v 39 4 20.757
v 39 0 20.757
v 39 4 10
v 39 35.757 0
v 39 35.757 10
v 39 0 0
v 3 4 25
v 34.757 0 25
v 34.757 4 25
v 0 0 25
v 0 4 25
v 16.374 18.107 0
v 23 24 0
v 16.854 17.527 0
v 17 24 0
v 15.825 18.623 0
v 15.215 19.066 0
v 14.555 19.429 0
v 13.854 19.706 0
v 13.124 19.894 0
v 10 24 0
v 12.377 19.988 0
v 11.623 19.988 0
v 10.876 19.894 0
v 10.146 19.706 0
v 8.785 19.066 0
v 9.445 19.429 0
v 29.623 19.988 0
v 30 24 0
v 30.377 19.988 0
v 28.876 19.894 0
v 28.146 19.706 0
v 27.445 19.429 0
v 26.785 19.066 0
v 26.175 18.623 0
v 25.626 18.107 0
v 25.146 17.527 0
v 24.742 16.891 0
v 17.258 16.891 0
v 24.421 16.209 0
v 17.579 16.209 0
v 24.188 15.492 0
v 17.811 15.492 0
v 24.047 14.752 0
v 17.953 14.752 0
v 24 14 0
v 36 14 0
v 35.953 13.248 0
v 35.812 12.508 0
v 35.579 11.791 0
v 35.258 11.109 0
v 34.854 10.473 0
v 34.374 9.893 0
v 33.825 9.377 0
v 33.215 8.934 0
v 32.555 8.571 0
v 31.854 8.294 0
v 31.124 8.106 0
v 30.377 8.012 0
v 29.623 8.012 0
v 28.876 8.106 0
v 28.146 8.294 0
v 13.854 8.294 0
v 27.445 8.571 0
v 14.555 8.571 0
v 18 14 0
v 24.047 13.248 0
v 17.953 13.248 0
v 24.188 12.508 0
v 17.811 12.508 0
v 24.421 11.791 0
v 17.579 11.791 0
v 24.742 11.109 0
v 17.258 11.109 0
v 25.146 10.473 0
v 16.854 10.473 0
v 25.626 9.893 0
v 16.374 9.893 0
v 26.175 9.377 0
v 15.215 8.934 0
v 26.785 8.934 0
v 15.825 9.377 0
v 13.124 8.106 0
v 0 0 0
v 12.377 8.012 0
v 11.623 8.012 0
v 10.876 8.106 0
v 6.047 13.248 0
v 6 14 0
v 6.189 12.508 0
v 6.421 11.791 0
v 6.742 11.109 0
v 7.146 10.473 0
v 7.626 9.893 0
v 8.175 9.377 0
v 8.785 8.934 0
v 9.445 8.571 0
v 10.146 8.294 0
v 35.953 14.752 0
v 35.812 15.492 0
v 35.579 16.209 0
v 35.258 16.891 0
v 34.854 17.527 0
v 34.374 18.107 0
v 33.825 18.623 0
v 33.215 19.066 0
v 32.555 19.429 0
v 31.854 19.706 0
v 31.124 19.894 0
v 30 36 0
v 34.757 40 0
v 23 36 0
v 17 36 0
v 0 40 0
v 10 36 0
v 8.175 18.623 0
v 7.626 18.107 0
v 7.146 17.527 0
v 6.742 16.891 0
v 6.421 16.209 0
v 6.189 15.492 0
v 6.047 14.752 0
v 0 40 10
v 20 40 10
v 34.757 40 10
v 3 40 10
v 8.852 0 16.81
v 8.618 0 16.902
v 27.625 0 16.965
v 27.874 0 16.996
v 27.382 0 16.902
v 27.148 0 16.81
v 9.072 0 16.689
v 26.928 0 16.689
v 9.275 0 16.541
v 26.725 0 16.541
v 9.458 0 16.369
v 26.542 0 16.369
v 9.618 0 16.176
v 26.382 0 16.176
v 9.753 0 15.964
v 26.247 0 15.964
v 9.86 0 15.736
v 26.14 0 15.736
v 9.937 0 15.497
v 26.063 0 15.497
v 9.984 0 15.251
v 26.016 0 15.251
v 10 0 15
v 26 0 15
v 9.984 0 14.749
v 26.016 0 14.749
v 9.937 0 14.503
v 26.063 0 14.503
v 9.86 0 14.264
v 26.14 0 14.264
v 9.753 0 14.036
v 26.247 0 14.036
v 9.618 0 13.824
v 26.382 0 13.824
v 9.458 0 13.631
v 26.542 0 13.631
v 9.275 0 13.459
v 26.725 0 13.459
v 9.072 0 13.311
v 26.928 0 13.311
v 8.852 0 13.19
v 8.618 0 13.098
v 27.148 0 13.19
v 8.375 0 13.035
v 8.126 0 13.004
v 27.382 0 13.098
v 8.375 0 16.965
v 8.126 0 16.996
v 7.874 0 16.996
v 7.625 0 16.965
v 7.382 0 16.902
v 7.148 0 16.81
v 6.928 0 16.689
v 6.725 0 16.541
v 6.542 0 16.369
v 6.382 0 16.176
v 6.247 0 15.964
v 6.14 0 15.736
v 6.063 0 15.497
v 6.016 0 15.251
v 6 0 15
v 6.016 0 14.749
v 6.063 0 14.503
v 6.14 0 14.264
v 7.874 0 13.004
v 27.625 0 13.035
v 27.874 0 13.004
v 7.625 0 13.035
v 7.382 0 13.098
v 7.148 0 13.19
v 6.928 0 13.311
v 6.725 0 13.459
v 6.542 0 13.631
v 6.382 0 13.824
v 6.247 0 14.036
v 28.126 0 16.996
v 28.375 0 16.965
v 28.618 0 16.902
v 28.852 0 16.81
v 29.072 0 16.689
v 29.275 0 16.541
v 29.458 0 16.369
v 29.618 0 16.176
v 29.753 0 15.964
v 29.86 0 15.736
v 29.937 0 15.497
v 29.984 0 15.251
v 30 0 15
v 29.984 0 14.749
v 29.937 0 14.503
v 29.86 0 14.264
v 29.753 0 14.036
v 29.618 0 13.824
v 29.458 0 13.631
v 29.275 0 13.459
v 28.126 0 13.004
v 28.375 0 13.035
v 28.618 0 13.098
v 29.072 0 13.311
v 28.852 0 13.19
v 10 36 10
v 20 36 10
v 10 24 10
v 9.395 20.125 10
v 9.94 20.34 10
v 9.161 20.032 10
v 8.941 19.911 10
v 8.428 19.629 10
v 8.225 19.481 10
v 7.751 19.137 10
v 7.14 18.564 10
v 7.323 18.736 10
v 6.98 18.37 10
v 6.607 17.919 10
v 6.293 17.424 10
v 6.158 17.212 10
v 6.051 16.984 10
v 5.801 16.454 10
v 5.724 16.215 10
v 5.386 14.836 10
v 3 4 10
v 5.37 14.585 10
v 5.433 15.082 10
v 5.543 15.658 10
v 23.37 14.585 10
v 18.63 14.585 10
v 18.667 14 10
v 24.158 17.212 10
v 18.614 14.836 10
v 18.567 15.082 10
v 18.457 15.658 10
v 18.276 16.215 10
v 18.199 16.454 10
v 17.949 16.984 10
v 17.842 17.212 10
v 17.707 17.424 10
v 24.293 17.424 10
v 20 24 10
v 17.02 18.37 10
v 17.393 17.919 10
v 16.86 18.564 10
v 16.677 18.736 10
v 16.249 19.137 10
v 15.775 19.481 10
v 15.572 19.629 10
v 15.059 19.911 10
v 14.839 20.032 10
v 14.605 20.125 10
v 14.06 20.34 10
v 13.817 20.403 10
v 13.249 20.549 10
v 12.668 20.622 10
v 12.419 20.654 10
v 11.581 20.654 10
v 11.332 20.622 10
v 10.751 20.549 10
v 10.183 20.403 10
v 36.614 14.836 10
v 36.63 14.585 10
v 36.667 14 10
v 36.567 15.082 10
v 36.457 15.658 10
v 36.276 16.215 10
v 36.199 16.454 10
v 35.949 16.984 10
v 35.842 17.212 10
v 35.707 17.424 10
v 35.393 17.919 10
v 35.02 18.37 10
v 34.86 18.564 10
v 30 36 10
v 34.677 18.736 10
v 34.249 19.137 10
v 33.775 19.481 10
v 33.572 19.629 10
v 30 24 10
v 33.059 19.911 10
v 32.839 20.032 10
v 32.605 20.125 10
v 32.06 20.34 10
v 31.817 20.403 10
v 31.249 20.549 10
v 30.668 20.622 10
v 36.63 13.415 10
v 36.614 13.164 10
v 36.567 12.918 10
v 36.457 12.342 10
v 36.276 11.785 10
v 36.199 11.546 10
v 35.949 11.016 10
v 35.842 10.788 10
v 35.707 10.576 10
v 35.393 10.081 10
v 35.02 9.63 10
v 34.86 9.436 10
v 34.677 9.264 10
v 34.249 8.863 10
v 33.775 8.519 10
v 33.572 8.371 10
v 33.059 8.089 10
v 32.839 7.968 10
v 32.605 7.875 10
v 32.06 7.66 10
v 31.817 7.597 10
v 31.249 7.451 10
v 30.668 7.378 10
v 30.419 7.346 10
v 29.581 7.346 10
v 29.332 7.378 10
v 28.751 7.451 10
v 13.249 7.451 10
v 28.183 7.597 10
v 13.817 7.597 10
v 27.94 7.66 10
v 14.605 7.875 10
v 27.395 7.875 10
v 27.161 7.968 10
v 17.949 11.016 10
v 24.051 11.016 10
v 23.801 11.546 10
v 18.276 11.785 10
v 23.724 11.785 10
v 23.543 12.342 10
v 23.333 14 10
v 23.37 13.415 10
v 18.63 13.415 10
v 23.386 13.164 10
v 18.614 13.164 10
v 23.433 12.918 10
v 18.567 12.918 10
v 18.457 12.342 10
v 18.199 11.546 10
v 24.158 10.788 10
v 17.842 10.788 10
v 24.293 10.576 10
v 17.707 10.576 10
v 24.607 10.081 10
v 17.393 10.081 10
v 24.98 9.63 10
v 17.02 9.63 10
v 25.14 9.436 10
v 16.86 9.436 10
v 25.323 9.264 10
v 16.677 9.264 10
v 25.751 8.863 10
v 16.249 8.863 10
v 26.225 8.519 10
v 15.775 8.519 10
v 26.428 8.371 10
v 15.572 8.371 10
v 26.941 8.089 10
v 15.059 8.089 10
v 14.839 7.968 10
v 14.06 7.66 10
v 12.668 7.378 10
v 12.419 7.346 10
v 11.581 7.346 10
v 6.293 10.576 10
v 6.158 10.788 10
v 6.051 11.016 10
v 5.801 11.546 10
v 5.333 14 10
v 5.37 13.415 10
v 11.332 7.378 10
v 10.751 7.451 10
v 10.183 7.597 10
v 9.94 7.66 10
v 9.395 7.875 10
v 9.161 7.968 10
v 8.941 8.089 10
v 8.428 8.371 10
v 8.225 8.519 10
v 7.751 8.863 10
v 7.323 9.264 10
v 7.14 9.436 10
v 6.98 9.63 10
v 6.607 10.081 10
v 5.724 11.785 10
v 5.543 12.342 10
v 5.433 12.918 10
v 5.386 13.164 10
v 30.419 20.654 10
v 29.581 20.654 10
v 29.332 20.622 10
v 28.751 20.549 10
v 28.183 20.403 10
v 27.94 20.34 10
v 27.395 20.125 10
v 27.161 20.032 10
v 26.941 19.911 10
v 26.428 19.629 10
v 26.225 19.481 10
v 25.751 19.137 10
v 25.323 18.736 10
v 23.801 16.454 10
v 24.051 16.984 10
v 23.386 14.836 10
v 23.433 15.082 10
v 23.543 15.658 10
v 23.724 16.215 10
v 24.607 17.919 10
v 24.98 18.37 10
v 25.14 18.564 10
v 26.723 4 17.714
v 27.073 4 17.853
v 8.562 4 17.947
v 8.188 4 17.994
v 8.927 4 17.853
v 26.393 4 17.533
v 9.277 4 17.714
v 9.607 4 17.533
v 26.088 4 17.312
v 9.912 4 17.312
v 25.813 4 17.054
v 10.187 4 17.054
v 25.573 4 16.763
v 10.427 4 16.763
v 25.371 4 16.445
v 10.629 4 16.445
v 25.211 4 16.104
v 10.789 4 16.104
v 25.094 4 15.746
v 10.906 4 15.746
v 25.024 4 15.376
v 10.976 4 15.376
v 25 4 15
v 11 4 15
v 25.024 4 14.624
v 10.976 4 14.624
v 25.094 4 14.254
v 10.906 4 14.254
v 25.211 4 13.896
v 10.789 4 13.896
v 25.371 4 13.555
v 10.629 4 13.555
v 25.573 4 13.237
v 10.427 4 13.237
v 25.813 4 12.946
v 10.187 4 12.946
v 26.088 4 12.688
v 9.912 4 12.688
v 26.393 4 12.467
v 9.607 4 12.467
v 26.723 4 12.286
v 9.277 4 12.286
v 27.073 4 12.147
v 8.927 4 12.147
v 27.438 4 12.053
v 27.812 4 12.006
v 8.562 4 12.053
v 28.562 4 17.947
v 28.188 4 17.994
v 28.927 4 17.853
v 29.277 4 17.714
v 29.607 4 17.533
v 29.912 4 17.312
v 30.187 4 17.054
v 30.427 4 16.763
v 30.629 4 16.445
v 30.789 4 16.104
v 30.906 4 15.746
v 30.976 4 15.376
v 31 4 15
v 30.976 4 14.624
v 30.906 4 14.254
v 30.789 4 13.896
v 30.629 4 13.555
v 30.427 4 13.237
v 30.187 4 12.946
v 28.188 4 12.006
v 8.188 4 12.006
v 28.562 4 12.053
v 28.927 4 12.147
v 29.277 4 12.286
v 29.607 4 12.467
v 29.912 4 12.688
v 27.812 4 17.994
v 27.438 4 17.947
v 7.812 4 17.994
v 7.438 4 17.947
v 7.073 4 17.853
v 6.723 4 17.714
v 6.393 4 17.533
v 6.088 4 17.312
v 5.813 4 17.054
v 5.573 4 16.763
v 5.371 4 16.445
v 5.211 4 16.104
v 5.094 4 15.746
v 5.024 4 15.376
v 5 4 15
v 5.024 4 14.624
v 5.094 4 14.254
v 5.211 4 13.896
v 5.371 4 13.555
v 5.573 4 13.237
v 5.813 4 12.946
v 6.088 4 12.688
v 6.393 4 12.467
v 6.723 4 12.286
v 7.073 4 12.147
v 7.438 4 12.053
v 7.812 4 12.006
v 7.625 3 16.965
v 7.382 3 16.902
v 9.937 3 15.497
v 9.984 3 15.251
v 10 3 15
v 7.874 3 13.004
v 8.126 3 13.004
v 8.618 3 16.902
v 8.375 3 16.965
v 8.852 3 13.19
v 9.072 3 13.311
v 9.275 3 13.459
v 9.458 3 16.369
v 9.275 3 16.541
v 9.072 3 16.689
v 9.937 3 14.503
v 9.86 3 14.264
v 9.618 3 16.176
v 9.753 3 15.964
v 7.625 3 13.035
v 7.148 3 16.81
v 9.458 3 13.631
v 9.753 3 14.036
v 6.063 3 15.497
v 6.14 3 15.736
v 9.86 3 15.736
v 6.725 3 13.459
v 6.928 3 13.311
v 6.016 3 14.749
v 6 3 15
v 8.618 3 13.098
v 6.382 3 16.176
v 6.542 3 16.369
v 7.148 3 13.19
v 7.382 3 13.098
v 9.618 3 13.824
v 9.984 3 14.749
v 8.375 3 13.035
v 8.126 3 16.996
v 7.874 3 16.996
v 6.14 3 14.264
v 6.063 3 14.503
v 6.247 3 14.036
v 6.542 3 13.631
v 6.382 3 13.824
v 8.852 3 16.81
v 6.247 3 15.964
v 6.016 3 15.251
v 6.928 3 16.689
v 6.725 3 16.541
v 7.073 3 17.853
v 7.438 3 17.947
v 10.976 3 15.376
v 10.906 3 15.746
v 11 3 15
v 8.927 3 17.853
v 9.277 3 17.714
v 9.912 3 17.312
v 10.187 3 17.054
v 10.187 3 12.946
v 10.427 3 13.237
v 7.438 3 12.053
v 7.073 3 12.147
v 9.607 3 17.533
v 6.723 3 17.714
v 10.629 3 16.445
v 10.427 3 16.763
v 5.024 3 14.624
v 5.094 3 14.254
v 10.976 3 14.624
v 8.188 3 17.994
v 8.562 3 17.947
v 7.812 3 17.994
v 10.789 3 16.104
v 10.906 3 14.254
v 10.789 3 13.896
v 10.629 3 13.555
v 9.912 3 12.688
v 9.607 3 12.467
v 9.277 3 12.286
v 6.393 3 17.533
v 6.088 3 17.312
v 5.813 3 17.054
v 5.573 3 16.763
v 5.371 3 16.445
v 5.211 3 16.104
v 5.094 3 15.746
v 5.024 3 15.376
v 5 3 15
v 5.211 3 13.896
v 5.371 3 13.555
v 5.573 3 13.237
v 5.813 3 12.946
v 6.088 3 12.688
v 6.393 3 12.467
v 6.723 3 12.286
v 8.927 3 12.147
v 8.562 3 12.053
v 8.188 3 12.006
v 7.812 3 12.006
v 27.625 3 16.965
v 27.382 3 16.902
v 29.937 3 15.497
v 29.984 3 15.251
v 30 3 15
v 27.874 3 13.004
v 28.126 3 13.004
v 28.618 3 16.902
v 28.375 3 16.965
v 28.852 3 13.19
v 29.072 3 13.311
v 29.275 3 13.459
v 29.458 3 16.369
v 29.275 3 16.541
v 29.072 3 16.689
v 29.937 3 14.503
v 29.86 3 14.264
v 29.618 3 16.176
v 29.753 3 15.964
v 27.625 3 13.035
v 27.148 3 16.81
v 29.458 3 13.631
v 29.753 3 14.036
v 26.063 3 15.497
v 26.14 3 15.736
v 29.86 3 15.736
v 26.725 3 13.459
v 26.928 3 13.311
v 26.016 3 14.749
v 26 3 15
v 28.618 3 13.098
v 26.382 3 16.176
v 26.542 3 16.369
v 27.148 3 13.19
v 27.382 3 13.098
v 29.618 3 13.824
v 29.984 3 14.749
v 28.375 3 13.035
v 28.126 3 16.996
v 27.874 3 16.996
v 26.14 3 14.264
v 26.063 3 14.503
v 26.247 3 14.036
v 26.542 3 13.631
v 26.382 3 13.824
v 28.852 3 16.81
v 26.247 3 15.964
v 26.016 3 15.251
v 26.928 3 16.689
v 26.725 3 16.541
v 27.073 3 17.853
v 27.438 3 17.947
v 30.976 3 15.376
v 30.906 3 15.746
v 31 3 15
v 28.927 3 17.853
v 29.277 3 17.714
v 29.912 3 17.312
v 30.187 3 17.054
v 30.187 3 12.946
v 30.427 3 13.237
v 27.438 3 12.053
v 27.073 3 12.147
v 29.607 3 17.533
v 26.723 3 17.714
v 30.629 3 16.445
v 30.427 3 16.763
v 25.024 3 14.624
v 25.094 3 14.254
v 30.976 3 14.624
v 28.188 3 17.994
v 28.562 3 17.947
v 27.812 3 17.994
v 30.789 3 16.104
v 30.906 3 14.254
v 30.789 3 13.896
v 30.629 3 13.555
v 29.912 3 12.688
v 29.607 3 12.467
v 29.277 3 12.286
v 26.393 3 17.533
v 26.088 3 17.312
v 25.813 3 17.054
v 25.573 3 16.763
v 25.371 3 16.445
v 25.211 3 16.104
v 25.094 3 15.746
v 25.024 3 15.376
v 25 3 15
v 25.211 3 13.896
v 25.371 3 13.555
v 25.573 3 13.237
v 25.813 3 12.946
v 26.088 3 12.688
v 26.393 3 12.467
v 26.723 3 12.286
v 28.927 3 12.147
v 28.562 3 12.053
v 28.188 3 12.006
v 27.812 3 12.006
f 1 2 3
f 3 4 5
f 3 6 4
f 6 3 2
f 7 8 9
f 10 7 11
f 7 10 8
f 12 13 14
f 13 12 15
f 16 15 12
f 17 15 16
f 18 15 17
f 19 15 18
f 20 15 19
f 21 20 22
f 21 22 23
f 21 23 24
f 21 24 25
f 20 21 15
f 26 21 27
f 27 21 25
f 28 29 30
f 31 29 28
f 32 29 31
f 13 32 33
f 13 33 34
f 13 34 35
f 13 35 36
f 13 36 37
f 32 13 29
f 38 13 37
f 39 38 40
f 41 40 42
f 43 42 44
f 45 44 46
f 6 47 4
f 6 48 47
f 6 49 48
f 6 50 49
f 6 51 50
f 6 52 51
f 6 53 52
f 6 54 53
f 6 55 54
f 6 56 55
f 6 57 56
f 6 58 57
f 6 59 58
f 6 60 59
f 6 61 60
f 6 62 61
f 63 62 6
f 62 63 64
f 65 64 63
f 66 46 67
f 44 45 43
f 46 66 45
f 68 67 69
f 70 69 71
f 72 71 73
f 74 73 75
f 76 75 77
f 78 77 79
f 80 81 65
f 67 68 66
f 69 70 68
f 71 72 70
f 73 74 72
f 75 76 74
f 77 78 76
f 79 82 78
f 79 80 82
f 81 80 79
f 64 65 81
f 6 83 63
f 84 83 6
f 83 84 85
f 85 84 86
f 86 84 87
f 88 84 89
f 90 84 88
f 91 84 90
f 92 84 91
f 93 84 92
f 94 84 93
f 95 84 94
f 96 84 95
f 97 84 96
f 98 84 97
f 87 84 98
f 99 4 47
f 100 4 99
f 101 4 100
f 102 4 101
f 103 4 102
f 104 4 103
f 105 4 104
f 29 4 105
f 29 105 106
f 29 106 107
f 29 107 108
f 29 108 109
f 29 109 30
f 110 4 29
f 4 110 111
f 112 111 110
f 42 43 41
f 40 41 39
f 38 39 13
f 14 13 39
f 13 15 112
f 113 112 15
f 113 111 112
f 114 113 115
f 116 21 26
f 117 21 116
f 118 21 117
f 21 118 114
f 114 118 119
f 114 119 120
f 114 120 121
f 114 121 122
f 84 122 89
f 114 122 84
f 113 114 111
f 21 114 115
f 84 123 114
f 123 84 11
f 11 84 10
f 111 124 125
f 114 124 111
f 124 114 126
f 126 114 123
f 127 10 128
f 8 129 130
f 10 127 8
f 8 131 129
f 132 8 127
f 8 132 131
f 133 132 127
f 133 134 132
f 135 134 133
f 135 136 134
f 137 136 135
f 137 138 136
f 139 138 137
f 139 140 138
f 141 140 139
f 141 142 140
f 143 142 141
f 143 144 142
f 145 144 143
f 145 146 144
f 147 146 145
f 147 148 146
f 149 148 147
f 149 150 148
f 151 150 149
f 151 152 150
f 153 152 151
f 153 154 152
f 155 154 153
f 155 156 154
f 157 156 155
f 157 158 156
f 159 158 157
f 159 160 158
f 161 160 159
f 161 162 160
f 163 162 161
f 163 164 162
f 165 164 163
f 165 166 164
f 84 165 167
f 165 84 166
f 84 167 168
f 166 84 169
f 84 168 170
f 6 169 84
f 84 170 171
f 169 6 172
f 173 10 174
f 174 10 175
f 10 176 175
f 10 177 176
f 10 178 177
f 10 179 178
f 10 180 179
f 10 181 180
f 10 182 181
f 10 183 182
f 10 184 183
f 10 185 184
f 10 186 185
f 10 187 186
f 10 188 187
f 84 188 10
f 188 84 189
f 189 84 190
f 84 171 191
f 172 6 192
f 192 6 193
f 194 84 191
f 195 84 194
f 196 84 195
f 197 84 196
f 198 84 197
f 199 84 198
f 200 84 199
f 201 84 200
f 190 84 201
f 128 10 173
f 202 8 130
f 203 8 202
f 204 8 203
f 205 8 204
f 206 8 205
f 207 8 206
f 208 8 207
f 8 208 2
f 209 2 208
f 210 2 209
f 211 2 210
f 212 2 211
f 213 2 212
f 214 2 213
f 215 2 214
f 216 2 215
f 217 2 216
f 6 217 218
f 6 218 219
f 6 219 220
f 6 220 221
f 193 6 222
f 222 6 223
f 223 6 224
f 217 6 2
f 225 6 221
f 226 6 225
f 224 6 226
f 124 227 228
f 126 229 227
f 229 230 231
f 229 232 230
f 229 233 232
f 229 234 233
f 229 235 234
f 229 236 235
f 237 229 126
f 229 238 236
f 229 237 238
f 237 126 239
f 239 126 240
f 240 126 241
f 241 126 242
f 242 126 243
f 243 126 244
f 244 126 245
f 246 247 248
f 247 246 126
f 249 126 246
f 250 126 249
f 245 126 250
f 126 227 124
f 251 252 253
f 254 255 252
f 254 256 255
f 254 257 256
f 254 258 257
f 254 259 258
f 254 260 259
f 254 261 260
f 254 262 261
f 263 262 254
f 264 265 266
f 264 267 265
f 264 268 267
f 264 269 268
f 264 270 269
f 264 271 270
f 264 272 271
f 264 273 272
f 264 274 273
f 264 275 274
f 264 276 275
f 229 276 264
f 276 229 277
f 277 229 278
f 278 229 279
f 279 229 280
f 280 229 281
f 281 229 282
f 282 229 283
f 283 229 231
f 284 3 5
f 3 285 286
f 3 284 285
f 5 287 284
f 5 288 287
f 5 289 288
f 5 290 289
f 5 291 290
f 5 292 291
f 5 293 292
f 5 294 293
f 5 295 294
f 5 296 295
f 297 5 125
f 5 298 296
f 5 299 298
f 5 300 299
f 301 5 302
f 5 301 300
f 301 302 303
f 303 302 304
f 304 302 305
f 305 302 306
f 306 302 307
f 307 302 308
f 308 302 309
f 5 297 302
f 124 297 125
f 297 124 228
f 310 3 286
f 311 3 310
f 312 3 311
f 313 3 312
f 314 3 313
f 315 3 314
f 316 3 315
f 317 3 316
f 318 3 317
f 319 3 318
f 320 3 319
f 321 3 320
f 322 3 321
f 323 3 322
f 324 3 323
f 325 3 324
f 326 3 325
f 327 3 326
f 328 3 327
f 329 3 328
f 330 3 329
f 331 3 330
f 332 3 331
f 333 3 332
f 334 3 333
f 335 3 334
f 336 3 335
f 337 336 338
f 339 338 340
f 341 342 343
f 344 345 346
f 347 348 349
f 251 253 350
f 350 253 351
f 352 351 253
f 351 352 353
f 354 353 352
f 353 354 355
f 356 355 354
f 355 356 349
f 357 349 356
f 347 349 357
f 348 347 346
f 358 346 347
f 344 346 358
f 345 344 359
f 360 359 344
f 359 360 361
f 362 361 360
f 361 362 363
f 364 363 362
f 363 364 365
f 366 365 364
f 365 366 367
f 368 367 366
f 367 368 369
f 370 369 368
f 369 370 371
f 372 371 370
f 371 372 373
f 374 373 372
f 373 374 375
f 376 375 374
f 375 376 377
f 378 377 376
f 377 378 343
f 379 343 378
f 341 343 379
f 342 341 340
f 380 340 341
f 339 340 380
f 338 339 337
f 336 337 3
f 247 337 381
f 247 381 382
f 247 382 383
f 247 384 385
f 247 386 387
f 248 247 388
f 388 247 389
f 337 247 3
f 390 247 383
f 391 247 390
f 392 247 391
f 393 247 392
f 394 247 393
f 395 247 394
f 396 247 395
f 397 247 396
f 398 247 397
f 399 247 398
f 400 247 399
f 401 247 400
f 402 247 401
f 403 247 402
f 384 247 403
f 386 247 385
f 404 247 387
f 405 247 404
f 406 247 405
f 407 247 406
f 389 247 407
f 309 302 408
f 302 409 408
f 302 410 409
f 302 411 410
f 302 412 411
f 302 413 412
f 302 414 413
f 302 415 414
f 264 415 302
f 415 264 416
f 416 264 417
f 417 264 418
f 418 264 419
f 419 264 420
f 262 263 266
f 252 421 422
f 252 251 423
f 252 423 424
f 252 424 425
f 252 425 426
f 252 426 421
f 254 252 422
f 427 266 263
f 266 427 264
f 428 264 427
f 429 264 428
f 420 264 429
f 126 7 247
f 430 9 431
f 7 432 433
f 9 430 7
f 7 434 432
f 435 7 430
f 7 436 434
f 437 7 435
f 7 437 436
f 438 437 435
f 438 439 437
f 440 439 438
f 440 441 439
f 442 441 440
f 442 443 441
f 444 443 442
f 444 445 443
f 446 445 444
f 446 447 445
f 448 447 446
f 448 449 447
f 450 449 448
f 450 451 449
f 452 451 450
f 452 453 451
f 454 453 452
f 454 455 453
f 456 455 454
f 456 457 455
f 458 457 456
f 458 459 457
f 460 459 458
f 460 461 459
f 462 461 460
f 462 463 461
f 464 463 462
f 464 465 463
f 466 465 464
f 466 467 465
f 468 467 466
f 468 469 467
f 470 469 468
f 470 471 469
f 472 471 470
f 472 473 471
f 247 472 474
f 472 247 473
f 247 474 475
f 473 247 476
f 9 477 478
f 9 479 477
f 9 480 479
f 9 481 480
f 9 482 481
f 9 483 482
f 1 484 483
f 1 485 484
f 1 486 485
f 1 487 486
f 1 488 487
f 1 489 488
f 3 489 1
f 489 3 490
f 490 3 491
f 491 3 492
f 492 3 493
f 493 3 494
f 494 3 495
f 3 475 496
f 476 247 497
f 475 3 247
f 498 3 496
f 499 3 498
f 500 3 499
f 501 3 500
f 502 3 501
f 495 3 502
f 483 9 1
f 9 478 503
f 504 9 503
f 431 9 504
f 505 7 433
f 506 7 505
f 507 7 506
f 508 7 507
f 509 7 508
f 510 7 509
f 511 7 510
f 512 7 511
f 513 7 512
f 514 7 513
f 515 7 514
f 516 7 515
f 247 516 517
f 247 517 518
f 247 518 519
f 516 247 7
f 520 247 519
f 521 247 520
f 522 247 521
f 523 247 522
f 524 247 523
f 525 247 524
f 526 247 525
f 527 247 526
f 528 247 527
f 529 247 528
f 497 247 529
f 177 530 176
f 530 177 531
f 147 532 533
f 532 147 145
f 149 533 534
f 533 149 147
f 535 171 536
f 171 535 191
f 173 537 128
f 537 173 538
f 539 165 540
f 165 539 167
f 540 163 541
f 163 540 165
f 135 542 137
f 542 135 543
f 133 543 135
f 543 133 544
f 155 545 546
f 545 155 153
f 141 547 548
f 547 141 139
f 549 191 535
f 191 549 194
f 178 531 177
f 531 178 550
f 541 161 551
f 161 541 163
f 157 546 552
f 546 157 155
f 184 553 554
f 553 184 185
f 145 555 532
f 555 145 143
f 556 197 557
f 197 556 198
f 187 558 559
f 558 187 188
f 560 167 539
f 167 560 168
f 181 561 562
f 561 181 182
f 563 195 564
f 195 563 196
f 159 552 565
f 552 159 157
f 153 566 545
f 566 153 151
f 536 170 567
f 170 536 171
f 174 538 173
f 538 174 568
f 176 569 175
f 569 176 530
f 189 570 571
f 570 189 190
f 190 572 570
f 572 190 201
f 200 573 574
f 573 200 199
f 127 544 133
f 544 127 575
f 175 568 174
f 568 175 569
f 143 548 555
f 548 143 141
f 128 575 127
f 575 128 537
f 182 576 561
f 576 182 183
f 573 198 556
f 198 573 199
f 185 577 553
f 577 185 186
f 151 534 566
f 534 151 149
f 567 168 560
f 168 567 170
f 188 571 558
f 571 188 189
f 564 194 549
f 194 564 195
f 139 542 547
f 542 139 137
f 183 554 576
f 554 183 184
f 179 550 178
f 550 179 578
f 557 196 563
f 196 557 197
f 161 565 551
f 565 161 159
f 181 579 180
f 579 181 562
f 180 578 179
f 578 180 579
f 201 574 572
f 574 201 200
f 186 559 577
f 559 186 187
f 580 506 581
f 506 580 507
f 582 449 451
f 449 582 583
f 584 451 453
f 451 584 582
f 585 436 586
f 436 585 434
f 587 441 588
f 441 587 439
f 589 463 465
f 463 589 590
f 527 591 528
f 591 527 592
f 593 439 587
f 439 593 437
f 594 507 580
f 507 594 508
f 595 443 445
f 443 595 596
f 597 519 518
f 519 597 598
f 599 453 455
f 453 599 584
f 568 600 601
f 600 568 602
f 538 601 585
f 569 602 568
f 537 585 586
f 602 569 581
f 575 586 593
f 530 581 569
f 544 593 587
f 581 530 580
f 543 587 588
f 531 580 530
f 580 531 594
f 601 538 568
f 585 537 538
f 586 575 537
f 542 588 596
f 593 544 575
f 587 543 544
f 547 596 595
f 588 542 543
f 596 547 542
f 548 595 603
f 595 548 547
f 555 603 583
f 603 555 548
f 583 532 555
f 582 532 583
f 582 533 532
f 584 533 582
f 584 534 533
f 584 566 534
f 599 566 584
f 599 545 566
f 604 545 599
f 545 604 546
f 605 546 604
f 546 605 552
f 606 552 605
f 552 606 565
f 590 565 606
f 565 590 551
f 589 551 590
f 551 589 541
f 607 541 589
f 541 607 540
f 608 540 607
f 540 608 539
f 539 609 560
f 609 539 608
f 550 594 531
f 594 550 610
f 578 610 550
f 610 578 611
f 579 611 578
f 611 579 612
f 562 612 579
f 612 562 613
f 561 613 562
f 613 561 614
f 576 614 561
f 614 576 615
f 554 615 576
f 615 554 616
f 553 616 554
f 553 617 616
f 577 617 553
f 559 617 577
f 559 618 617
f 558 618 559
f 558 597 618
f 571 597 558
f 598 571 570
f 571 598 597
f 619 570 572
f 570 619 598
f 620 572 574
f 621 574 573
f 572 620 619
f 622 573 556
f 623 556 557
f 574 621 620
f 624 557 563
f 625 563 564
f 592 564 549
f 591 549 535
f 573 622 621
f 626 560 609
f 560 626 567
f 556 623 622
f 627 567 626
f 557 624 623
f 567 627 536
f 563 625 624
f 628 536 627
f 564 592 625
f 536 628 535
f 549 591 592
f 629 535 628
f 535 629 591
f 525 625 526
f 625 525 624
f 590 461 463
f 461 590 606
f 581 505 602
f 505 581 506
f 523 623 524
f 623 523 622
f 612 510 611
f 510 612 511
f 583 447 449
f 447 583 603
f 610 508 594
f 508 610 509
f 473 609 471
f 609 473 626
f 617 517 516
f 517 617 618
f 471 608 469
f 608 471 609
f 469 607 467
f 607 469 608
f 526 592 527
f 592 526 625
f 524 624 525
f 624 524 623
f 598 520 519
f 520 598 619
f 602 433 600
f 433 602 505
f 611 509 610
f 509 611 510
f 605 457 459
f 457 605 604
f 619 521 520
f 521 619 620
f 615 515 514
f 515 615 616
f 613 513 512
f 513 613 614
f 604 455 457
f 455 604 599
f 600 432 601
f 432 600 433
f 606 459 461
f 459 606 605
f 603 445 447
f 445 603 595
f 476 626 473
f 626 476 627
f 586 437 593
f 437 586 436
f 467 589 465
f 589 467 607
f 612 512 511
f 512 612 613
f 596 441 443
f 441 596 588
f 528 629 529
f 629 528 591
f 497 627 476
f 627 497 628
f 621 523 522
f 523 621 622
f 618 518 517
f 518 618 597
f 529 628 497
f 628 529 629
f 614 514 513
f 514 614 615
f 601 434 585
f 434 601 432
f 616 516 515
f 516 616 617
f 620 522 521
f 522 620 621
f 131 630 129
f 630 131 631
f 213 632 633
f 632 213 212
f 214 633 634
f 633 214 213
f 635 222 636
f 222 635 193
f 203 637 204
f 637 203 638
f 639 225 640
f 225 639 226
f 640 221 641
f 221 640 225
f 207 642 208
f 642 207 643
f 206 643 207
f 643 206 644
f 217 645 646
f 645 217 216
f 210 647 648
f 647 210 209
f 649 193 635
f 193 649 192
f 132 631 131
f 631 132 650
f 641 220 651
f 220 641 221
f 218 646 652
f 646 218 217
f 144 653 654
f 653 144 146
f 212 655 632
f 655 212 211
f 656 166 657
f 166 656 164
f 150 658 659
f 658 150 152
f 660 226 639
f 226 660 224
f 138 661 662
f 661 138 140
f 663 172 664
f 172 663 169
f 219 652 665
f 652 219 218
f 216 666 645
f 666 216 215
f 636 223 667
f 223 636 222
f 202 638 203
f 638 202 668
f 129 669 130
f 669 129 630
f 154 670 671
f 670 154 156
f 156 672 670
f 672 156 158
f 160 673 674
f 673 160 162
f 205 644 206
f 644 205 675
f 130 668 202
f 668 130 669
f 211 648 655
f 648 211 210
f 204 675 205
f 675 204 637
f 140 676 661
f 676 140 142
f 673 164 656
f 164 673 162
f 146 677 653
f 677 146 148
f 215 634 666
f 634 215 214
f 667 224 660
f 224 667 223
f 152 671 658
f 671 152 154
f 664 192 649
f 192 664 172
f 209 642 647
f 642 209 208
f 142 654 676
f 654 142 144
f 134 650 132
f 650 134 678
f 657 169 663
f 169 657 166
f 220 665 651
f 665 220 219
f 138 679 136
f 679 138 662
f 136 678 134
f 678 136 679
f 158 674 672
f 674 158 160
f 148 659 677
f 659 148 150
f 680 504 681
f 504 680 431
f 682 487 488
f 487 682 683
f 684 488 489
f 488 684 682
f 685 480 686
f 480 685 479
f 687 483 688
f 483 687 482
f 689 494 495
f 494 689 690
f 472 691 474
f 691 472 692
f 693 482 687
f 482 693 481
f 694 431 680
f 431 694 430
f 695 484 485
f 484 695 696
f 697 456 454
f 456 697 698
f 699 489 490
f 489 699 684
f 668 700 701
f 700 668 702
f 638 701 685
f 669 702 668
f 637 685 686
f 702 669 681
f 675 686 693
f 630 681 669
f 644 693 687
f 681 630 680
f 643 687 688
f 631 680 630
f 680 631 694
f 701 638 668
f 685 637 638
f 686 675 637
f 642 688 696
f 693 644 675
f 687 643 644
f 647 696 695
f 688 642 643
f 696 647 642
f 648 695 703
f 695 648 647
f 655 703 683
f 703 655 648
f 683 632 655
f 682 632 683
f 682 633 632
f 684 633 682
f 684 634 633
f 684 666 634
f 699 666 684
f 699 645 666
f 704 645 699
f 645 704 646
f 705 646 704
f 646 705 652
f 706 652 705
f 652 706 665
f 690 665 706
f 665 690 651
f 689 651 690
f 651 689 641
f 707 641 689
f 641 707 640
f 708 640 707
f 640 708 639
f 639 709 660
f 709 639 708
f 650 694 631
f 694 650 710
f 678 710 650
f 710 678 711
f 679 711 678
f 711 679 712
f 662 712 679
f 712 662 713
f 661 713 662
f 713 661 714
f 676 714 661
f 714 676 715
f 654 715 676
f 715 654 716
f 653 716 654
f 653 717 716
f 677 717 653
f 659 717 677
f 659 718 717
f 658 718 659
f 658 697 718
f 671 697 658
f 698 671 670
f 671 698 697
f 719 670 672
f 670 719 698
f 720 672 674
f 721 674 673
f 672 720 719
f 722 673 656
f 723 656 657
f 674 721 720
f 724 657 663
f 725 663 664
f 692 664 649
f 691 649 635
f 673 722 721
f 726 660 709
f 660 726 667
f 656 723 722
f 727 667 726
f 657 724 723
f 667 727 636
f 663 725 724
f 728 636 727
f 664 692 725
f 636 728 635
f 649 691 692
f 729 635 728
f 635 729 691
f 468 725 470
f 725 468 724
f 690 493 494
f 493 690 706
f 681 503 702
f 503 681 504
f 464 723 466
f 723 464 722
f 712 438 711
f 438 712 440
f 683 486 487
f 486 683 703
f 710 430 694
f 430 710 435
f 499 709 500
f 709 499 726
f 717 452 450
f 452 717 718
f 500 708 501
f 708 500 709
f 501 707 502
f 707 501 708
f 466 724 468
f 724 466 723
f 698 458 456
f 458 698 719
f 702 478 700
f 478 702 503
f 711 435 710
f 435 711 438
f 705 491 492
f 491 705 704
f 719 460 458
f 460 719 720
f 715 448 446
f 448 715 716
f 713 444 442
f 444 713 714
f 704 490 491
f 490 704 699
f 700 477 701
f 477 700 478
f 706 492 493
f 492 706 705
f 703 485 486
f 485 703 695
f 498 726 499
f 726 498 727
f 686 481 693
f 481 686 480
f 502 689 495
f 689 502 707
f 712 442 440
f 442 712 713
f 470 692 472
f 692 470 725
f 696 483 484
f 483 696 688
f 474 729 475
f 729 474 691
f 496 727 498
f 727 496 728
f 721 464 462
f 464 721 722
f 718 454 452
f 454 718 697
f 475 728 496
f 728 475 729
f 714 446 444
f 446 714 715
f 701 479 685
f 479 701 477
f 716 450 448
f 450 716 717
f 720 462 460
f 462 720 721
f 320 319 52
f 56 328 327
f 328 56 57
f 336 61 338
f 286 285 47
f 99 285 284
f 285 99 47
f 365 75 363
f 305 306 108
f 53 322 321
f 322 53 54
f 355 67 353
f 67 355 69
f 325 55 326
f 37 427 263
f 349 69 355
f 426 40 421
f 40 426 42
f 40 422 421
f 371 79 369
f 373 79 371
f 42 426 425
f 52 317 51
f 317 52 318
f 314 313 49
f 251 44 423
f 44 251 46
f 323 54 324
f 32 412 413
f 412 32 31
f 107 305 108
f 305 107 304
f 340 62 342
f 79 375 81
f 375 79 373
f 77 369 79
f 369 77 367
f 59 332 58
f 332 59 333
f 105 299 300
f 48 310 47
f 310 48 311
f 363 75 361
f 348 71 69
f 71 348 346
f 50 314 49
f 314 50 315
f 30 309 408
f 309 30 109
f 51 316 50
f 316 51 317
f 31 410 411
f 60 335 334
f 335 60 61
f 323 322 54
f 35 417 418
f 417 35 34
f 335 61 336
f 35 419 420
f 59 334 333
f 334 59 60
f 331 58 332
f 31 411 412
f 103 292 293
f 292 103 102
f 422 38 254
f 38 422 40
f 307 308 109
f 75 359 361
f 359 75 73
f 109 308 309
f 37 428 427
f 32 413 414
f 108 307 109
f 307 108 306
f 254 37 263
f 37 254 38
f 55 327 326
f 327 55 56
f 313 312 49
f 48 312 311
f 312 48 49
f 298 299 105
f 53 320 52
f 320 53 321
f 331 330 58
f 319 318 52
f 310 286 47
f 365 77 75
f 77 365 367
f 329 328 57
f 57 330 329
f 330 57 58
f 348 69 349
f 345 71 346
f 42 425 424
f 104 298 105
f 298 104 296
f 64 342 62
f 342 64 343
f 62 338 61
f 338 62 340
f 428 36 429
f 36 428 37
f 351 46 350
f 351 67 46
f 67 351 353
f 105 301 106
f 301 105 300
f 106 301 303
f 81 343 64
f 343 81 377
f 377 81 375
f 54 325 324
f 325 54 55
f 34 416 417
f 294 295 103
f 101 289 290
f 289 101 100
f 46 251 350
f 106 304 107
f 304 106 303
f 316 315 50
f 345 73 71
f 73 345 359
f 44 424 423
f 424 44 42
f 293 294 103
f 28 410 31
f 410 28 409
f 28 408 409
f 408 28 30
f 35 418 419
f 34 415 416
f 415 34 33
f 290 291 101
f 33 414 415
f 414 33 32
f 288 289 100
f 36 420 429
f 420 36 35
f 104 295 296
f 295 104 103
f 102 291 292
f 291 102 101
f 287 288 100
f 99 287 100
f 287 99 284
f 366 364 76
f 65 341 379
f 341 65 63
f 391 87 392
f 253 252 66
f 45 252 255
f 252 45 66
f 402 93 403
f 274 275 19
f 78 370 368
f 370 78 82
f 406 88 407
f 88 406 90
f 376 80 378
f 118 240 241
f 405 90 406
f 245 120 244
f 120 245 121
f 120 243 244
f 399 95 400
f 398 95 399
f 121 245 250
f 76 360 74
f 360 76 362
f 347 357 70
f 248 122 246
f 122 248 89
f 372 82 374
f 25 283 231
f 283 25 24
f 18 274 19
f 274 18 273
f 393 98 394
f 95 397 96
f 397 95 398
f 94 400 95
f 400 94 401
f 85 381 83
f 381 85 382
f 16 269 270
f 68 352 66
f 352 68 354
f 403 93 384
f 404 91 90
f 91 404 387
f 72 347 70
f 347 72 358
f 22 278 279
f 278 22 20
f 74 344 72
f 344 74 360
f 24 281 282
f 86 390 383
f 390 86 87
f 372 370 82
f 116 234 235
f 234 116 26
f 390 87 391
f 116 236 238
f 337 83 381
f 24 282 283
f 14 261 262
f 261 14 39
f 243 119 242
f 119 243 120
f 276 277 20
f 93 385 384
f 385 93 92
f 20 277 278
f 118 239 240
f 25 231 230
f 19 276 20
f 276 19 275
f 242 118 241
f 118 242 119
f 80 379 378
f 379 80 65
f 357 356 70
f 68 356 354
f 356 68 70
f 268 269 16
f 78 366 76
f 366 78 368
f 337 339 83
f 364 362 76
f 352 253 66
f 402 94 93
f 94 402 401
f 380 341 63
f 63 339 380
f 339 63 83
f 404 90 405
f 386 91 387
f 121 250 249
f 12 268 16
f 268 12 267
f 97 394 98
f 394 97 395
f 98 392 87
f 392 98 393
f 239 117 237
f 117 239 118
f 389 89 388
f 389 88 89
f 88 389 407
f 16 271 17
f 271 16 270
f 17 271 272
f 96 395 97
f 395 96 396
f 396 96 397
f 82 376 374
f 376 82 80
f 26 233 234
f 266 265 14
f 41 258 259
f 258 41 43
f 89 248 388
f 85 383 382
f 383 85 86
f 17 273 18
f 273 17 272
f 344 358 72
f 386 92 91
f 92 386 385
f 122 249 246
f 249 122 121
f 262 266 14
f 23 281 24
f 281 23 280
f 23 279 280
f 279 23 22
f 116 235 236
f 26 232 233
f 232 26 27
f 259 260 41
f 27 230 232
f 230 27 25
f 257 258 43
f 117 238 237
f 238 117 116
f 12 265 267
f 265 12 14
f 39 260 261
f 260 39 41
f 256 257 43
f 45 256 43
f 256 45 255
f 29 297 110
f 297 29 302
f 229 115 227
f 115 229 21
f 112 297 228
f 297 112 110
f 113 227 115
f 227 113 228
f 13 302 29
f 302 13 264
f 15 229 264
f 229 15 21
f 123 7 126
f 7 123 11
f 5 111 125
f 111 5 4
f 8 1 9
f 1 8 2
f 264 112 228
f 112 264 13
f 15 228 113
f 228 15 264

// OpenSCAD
$fn = 50;
difference() { 
cube (size = [39, 40, 25]);
translate ([3, 4, 10]) cube (size = [36, 40, 15]);


translate ([8, 5, 15]) rotate (a = [90, 0, 0]) cylinder (h = 6, r = 2);
translate ([8, 5, 15]) rotate (a = [90, 0, 0]) cylinder (h = 2, r = 3);
translate ([28, 5, 15]) rotate (a = [90, 0, 0]) cylinder (h = 6, r = 2);
translate ([28, 5, 15]) rotate (a = [90, 0, 0]) cylinder (h = 2, r = 3);


translate ([30, 14, 0]) cylinder (h = 15, r1 = 6, r2 = 7);
translate ([12, 14, 0]) cylinder (h = 15, r1 = 6, r2 = 7);


translate ([10, 24, 0]) cube (size = [20, 12, 15]);


rotate (a = [0, 90, 0]) 
linear_extrude(5,center = false,2,twist = 0,slices = 20){
		polygon([[-25,40],[-10,40],[-25,4]]);}
		

translate ([39, 40, 0]) rotate (a = [0, 0, 45]) cube (size = [6, 6, 25], center = true);
translate ([39, 0, 25]) rotate (a = [90, 45, 0]) cube (size = [6, 6, 10], center = true);
}

translate ([10, 40, 0]) rotate (a = [90, 0, 0]) 
linear_extrude(20,center = false,2,twist = 0,slices = 20){
		polygon([[10,10],[13,0],[7,0]]);}
